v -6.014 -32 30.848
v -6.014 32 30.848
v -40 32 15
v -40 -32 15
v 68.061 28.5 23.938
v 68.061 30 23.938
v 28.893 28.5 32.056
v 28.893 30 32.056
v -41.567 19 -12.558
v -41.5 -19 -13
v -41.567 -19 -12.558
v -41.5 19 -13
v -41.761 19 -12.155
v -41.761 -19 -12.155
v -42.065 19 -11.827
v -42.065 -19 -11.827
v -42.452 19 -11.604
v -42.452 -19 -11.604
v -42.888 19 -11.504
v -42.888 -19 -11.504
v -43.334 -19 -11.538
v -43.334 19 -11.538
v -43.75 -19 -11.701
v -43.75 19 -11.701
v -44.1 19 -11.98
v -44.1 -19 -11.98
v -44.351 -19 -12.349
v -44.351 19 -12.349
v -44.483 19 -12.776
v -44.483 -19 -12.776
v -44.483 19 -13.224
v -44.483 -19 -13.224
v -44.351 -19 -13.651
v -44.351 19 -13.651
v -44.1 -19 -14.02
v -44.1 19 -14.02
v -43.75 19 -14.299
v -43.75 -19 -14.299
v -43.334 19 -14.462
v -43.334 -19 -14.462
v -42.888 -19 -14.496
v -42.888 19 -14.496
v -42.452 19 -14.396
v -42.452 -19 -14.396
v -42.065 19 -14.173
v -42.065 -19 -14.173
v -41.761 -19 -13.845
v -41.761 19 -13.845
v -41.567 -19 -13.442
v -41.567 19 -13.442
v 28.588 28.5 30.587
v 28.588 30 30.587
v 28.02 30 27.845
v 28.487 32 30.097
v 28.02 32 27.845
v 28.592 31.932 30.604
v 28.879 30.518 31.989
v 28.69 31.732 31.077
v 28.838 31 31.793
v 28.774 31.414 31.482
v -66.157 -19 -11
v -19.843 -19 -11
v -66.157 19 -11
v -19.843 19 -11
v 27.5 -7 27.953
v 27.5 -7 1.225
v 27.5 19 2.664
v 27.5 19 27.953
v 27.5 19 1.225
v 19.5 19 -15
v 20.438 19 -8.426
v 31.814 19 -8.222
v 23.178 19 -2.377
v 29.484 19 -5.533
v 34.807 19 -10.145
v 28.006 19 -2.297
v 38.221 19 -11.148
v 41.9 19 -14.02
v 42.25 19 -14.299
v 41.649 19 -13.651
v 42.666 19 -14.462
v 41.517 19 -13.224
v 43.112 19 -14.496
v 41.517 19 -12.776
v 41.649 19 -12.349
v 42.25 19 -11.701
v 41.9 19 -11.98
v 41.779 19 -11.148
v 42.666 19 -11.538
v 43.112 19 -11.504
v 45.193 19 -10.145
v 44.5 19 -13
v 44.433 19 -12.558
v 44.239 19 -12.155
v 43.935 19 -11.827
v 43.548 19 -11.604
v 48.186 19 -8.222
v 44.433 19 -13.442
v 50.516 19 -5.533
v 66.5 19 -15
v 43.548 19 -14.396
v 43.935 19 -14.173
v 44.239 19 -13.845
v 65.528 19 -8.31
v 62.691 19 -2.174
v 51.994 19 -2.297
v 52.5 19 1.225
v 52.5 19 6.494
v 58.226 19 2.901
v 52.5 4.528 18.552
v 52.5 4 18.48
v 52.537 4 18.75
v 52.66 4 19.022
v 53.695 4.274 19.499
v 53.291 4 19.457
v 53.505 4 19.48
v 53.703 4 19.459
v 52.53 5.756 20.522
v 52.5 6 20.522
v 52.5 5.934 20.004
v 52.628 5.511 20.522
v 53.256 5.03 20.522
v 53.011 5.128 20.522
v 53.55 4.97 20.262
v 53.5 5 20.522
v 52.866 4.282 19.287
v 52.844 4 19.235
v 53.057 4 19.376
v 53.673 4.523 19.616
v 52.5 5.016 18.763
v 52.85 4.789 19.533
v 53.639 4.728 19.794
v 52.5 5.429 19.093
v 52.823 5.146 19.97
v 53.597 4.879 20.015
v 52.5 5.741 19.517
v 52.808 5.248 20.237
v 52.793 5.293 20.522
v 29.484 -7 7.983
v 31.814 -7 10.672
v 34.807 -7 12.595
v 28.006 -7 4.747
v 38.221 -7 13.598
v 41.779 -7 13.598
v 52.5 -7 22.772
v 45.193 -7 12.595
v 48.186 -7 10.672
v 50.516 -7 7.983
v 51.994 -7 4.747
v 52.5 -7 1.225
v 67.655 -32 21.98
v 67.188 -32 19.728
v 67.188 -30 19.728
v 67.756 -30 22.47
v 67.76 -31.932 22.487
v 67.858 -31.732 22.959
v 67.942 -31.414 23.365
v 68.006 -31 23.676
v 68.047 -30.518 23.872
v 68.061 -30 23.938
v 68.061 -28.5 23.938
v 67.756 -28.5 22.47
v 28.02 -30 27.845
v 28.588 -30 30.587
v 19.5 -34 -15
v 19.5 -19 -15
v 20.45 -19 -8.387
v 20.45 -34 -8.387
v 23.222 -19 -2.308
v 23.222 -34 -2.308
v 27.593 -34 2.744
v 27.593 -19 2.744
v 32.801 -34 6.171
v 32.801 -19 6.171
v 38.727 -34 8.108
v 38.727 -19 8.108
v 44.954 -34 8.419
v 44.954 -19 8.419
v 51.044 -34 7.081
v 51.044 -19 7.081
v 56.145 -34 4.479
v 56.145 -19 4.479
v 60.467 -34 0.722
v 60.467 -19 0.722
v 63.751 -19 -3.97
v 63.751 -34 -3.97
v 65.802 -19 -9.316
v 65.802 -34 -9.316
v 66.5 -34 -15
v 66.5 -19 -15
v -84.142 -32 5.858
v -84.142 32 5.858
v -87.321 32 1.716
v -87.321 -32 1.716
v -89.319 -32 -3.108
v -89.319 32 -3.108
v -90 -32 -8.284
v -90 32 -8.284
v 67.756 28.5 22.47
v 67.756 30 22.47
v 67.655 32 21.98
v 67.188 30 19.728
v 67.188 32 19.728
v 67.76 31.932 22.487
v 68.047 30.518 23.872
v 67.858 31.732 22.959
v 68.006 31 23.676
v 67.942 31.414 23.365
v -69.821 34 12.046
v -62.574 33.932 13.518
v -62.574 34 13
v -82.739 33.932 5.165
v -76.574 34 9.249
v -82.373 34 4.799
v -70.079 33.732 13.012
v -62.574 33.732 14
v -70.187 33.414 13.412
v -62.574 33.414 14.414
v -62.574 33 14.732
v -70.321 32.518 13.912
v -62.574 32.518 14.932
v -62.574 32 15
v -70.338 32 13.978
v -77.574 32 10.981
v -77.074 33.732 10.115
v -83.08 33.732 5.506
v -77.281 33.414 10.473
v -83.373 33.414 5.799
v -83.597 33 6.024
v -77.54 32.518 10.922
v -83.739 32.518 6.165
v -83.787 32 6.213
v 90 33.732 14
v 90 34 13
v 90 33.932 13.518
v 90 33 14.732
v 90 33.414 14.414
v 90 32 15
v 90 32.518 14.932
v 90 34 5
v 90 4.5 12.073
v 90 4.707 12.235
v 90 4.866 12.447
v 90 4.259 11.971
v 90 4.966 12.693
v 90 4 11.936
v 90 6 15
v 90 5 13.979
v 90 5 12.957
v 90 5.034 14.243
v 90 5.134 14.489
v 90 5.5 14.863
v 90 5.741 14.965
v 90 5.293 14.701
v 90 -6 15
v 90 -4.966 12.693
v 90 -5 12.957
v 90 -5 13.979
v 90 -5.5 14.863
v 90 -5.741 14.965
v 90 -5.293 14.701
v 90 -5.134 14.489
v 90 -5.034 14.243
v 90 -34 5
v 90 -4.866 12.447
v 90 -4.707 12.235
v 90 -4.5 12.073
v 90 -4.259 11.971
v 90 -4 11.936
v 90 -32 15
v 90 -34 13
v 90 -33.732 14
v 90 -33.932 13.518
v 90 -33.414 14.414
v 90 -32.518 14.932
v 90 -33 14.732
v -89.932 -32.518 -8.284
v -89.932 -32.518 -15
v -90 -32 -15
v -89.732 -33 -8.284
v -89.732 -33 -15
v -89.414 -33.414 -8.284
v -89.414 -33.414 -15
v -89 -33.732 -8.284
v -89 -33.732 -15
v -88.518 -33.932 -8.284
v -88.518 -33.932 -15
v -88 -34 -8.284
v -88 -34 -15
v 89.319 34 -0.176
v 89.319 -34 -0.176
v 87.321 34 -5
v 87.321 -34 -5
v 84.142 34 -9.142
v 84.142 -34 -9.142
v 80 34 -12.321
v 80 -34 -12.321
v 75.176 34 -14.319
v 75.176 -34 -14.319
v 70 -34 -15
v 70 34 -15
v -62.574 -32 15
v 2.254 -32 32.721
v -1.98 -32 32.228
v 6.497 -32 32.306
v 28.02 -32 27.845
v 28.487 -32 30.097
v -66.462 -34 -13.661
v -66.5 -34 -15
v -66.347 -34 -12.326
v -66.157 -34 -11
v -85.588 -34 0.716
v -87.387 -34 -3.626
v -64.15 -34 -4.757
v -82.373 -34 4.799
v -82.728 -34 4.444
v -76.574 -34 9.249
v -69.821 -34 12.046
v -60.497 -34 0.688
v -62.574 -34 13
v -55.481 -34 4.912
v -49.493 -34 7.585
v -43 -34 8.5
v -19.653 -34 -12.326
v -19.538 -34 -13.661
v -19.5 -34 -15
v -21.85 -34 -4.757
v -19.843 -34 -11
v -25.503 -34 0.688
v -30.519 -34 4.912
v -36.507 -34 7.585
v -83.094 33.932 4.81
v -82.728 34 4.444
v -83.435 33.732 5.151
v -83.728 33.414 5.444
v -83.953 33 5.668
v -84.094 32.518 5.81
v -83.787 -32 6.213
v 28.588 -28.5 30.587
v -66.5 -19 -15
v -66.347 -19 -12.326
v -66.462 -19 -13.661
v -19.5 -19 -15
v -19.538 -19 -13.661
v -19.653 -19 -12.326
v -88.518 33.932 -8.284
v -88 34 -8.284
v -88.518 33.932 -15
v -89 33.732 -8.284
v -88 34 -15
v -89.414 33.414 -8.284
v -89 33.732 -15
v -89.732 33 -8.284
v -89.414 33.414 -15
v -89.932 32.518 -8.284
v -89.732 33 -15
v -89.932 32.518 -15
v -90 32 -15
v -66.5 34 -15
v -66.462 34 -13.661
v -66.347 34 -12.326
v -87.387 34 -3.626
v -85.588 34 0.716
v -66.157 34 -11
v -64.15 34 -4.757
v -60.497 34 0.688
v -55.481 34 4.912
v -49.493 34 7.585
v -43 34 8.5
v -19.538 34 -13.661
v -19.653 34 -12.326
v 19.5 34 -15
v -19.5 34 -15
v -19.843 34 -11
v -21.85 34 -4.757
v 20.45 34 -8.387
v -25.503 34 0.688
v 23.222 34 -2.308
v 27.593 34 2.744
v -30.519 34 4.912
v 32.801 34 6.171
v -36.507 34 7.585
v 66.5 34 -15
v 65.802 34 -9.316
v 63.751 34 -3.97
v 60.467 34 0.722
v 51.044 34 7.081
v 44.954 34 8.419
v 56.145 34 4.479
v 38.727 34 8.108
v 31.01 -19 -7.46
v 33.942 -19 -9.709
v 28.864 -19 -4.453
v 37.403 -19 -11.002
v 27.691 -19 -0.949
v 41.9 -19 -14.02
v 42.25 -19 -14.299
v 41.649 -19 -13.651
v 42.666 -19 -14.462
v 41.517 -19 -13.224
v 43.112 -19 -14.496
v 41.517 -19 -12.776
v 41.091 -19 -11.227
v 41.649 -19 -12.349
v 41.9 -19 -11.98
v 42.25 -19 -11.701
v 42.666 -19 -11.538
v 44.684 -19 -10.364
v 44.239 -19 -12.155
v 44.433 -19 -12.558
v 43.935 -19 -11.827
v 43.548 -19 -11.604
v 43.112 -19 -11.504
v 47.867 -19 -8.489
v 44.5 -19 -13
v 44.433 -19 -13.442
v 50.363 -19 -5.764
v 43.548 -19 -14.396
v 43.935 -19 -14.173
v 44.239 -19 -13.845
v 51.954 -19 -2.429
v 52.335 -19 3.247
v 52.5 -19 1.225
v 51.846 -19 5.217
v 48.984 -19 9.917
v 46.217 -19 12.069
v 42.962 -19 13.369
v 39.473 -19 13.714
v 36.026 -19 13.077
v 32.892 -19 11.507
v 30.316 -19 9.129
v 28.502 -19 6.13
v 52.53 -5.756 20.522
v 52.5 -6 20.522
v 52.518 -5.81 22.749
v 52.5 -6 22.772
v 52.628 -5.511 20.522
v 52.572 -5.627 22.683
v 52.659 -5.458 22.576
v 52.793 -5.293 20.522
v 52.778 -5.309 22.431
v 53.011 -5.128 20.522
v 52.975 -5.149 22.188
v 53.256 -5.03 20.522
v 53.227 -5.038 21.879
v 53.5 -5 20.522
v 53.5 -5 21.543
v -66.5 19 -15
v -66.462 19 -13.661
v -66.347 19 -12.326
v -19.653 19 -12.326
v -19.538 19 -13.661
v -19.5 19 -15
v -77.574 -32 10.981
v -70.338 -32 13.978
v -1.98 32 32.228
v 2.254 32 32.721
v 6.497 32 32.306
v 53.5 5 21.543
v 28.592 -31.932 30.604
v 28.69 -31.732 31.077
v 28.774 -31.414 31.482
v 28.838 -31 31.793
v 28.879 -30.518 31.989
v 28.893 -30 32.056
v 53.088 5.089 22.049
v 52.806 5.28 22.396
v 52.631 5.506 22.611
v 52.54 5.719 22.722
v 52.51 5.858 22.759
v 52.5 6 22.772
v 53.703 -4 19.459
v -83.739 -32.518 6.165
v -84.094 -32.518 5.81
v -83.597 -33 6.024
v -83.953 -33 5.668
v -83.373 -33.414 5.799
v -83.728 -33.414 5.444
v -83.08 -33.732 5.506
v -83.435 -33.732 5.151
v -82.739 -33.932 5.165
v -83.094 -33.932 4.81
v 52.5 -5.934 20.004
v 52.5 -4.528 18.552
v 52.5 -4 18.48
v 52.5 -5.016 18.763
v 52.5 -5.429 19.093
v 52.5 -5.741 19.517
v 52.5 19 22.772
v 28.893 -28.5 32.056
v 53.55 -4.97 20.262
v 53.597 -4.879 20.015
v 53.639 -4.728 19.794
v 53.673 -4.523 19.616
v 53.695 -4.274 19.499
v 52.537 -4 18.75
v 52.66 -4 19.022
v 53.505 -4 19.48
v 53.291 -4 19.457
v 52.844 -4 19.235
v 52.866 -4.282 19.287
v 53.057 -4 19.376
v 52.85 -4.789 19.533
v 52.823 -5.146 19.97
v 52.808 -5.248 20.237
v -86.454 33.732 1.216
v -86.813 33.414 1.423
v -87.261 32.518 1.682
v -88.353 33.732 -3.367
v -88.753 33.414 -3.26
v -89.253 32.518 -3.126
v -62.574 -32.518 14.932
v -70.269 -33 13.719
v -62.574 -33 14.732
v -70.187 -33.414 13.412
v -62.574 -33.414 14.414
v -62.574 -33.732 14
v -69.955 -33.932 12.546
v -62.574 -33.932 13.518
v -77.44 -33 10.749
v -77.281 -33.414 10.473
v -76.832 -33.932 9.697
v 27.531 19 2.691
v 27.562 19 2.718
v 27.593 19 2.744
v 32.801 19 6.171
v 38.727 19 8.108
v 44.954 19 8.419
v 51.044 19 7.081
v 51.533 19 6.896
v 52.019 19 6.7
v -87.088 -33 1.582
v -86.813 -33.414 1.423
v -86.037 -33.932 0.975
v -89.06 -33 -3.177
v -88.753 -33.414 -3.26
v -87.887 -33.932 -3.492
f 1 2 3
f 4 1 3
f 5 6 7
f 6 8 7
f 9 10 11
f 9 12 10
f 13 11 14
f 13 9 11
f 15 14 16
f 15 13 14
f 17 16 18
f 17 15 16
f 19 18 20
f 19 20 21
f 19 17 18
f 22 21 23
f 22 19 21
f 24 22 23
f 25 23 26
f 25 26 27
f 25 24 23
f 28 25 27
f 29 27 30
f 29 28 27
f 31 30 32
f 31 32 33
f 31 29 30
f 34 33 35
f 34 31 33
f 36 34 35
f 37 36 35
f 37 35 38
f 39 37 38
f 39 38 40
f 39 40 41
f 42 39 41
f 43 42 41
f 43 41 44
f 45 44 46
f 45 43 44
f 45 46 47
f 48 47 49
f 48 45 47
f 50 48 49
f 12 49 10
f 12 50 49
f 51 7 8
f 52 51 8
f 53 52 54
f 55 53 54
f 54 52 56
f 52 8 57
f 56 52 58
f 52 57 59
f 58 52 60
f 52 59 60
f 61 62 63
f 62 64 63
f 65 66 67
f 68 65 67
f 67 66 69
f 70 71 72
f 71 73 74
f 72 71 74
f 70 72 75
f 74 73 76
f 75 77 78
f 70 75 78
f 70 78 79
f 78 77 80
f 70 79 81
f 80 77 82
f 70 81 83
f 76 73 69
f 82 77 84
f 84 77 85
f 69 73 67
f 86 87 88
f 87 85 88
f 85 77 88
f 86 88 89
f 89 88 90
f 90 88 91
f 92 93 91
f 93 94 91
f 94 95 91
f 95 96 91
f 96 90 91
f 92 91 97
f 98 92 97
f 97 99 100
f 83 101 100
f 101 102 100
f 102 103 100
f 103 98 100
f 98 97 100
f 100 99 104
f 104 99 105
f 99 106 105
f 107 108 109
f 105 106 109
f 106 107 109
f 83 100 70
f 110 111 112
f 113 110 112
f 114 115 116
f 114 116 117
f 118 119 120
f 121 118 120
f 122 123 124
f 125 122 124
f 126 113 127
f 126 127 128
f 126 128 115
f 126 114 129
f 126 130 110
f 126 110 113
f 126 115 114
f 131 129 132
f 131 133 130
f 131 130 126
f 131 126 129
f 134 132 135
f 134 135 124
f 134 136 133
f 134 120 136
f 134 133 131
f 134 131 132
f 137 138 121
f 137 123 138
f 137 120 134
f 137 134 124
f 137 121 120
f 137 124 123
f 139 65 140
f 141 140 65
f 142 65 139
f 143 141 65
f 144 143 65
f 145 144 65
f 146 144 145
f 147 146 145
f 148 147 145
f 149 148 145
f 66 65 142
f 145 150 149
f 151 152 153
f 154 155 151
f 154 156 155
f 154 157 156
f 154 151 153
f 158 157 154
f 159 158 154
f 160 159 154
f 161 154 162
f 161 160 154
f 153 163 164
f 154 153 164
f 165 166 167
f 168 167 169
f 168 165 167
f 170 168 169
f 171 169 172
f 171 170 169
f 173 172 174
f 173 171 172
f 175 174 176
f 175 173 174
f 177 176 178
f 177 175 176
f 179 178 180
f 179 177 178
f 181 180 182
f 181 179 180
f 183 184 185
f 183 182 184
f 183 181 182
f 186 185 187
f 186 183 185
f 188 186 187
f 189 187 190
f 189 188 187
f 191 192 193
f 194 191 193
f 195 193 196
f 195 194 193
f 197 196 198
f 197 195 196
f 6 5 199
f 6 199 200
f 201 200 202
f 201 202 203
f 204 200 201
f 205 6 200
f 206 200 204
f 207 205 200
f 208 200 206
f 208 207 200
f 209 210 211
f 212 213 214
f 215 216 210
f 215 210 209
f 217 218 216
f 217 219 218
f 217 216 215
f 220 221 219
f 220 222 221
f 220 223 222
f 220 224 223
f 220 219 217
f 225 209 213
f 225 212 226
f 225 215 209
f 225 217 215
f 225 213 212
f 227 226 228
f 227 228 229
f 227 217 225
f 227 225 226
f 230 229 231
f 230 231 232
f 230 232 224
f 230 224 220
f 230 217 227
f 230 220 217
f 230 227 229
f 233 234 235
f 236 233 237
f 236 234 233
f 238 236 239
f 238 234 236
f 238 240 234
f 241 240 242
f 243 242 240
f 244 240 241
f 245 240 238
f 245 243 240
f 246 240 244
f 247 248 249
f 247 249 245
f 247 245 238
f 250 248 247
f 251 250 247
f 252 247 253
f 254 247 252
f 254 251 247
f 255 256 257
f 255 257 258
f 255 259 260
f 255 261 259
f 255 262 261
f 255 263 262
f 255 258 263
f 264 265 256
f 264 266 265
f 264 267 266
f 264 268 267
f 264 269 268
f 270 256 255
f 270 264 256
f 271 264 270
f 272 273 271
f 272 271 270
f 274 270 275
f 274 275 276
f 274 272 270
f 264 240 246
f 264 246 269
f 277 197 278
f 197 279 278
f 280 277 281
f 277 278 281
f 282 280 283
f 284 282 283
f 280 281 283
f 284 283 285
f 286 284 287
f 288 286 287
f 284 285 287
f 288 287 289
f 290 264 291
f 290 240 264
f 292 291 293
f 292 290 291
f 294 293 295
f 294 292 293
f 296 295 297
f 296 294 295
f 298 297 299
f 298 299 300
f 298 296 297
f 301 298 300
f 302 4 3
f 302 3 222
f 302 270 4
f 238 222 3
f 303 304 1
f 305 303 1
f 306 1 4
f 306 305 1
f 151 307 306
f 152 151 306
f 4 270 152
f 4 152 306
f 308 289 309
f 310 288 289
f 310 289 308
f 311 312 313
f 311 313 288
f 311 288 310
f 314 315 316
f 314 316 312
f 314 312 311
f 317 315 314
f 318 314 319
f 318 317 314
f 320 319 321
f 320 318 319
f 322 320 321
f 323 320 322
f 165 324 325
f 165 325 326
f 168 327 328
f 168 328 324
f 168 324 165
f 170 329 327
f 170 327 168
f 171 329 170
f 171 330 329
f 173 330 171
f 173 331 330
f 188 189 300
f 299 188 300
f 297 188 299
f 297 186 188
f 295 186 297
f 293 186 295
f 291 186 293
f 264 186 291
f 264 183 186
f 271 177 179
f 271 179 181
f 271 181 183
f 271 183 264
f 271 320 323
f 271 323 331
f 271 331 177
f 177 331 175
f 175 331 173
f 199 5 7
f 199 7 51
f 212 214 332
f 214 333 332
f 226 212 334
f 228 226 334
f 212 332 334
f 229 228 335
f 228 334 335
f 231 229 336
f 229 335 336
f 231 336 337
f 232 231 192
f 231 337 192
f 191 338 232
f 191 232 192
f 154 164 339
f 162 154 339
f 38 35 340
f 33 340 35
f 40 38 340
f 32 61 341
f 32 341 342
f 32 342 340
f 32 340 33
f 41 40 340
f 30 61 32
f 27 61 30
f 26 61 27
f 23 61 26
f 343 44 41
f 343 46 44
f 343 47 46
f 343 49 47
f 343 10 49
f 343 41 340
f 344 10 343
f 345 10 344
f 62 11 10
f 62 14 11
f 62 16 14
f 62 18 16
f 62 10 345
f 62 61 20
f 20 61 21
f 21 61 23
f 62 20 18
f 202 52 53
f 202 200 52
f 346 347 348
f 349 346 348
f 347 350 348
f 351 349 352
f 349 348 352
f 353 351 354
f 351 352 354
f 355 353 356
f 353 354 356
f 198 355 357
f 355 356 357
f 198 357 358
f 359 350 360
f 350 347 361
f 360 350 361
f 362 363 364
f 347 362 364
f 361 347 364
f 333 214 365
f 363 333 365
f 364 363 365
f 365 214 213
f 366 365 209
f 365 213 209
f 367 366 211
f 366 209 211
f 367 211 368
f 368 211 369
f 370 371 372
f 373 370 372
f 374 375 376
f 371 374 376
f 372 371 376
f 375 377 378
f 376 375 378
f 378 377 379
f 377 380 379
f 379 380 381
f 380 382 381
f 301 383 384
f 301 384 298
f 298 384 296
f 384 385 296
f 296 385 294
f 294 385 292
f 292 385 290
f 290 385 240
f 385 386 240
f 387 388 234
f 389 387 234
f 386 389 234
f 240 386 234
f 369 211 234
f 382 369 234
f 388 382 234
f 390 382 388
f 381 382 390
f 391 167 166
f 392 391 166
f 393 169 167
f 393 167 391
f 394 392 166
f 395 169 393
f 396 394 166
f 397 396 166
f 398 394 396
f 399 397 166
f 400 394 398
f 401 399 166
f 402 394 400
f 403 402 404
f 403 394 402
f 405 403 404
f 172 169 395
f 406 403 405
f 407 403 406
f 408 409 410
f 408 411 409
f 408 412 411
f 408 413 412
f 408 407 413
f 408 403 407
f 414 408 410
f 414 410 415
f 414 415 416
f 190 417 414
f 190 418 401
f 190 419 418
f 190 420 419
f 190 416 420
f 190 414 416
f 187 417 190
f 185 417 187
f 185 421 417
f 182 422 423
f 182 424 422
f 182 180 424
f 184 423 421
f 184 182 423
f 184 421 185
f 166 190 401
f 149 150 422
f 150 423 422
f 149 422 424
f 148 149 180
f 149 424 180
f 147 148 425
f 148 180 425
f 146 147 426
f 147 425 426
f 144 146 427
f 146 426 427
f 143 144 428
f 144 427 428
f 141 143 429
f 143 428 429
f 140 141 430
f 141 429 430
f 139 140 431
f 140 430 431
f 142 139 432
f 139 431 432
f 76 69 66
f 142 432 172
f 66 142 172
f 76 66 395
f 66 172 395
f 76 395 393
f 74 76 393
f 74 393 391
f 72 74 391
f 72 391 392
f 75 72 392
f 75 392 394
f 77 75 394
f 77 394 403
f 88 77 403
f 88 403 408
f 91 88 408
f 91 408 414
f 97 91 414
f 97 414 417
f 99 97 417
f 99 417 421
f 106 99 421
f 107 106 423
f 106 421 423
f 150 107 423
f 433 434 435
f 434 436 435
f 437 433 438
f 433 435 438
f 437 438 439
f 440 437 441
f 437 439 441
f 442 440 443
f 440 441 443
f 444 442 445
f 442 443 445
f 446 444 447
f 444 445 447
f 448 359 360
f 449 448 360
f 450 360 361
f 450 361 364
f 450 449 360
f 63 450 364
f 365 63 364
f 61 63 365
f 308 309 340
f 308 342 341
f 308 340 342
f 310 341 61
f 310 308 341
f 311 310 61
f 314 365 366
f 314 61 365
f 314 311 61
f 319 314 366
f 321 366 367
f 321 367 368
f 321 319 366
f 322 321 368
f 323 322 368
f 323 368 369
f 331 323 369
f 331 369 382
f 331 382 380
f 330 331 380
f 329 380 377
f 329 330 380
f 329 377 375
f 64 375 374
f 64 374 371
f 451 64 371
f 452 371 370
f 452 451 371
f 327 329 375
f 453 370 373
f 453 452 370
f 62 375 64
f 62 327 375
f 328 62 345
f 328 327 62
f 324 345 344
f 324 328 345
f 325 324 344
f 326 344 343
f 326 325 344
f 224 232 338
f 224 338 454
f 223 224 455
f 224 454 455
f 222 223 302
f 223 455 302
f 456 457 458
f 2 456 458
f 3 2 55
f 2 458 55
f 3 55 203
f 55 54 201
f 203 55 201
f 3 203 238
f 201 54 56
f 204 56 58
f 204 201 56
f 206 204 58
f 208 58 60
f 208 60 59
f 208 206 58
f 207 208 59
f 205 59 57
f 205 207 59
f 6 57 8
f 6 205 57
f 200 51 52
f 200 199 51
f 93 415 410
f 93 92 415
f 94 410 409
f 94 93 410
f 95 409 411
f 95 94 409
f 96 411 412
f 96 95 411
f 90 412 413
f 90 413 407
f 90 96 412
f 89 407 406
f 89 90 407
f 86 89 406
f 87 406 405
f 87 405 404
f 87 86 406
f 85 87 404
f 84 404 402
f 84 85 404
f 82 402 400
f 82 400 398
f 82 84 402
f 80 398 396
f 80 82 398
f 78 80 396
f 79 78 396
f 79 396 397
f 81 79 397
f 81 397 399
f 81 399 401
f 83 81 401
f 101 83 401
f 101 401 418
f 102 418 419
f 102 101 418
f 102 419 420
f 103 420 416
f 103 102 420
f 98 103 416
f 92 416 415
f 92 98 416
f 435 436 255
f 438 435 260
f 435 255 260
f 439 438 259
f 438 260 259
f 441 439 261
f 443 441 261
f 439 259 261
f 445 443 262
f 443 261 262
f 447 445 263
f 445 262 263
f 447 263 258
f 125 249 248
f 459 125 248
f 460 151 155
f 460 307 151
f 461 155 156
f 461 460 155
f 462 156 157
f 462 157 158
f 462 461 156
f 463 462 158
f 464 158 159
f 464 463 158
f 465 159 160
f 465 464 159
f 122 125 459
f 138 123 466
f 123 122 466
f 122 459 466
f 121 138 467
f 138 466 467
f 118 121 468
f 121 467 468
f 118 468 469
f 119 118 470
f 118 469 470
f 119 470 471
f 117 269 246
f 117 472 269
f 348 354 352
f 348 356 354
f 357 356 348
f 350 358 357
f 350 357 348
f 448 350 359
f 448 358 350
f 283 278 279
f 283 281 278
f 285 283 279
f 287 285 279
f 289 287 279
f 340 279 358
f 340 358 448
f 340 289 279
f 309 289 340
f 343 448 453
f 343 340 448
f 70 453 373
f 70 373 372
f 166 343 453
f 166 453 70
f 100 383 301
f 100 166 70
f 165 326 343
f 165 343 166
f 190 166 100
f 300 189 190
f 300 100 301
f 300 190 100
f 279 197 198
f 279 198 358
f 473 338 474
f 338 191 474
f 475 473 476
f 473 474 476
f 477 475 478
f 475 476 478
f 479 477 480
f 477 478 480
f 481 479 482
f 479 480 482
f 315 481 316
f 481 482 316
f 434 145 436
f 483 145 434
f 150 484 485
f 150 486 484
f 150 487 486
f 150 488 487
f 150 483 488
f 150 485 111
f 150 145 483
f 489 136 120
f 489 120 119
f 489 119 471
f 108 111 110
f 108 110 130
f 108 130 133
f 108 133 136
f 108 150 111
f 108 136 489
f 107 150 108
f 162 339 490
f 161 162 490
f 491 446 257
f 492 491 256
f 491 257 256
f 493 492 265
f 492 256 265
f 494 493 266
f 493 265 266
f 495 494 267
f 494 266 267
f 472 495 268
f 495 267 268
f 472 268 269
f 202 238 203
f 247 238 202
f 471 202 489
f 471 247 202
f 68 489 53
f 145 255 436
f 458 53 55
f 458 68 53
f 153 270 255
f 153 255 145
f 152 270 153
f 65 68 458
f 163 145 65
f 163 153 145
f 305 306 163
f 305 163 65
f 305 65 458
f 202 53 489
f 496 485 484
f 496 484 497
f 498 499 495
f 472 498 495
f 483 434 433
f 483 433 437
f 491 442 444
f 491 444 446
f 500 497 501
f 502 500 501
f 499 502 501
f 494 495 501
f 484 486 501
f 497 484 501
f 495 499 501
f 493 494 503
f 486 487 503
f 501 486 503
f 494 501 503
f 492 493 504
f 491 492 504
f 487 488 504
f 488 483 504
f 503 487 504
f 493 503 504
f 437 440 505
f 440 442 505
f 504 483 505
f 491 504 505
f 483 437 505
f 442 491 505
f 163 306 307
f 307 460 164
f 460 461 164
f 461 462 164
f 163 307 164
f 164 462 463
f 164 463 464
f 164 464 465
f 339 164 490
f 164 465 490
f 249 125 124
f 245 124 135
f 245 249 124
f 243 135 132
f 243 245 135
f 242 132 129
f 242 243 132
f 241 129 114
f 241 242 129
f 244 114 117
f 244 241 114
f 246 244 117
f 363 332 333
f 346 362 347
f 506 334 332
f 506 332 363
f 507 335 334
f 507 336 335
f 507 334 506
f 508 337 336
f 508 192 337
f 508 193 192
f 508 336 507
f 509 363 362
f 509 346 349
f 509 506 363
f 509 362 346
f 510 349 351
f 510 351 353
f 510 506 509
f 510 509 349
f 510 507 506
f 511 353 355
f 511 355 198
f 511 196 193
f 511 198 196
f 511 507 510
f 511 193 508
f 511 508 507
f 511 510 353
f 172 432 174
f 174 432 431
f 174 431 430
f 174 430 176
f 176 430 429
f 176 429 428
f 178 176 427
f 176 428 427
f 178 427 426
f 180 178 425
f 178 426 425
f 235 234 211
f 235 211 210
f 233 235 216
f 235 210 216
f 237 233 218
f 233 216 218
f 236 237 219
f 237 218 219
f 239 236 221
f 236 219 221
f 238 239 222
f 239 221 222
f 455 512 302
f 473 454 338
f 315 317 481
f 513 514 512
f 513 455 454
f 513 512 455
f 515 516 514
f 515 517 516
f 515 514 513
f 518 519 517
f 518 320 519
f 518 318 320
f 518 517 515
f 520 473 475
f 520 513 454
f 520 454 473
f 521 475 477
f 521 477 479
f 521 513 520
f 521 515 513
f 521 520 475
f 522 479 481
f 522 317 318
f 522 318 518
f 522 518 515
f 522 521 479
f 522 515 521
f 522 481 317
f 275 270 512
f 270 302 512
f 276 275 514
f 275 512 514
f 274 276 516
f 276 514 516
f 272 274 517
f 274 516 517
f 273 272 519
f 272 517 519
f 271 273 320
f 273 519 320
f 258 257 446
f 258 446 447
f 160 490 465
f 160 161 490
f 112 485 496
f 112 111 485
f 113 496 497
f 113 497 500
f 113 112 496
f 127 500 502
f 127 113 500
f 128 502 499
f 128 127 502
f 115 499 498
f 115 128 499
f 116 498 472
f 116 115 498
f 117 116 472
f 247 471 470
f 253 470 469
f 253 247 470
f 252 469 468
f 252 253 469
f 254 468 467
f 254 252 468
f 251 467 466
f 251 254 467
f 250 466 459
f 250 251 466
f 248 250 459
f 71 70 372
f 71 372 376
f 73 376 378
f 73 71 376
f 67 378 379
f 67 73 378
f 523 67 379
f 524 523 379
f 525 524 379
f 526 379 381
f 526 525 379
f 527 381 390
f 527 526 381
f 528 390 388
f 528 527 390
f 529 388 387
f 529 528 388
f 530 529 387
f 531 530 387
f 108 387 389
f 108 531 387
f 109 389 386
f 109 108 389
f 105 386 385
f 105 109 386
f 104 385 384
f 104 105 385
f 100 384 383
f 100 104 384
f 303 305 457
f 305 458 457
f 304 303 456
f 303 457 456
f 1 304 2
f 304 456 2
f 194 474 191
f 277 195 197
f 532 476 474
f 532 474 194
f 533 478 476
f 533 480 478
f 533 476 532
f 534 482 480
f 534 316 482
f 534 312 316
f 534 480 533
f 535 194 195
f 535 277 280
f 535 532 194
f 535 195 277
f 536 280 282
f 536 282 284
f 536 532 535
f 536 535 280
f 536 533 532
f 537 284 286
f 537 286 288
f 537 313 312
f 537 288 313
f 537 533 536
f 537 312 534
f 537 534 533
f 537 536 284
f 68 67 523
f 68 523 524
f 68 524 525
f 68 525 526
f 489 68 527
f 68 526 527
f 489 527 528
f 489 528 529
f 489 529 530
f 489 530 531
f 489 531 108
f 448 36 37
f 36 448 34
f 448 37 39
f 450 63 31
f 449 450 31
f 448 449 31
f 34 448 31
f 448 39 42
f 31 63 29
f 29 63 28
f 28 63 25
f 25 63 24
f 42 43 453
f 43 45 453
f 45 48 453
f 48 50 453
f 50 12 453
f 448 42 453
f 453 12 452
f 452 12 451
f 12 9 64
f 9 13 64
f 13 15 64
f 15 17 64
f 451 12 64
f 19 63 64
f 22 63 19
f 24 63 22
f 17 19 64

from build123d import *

# Parameters (mm, degrees)
F1_DEPTH       = 34
F2_DEPTH       = 32
F0_R           = 1.5
F3_DEPTH       = 19
F4_R           = 12.5
F5_DEPTH       = 38
F7_W           = 25
F7_H           = 26
F8_DEPTH       = 32.4283063262
F9_R           = 20
F10_R          = 30
F11_R          = 1.99999
F12_R          = 20
F15_DEPTH      = 15
F15_DEPTH_BACK = 25
F16_R          = 2
F17_W          = 10
F17_H          = 6
F18_DEPTH      = 40
F19_R          = 1


# Not quite as in the source:
# - a fillet or chamfer is up to 0.001 mm smaller than in the source, because OpenCascade refuses the exact size


with BuildPart() as f1:
    # F0 (on Front) → F1 (new body, symmetric)
    with BuildSketch(Plane.XZ):
        with BuildLine():
            Line((90, -15), (90, 15))
            Line((90, 15), (-40, 15))
            Line((-40, 15), (-75, 15))
            Line((-75, 15), (-90, 0))
            Line((-90, 0), (-90, -15))
            Line((-90, -15), (-66.5, -15))
            ThreePointArc((-66.5, -15), (-66.4141111332, -12.9926634954), (-66.1570723538, -11))
            ThreePointArc((-66.1570723538, -11), (-43, 8.5), (-19.8429276462, -11))
            ThreePointArc((-19.8429276462, -11), (-19.5858888668, -12.9926634954), (-19.5, -15))
            Line((-19.5, -15), (19.5, -15))
            ThreePointArc((19.5, -15), (21.6186797268, -5.2486337688), (27.5926930532, 2.7444327226))
            ThreePointArc((27.5926930532, 2.7444327226), (37.7272727273, 13.516632815), (51.0436705831, 7.0805200018))
            ThreePointArc((51.0436705831, 7.0805200018), (62.2519642985, -1.5236551451), (66.5, -15))
            Line((66.5, -15), (90, -15))
        make_face()
        with BuildLine():
            ThreePointArc((27.5926930532, 2.7444327226), (38.7272727273, 8.1083059018), (51.0436705831, 7.0805200018))
            ThreePointArc((51.0436705831, 7.0805200018), (37.7272727273, 13.516632815), (27.5926930532, 2.7444327226))
        make_face()
    extrude(amount=F1_DEPTH, both=True)

    # F0 (on Front) → F2 (join, symmetric)
    with BuildSketch(Plane.XZ):
        Polygon((-40, 15), (90, 15), (0, 33.6523063262), align=None)
    extrude(amount=F2_DEPTH, both=True)

    # F0 (on Front) → F3 (join, symmetric)
    with BuildSketch(Plane.XZ):
        with BuildLine():
            Line((-66.5, -15), (-19.5, -15))
            ThreePointArc((-19.5, -15), (-19.5858888668, -12.9926634954), (-19.8429276462, -11))
            Line((-19.8429276462, -11), (-66.1570723538, -11))
            ThreePointArc((-66.1570723538, -11), (-66.4141111332, -12.9926634954), (-66.5, -15))
        make_face()
        with Locations((-43, -13)):
            Circle(F0_R, mode=Mode.SUBTRACT)
        with BuildLine():
            Line((19.5, -15), (66.5, -15))
            ThreePointArc((66.5, -15), (62.2519642985, -1.5236551451), (51.0436705831, 7.0805200018))
            ThreePointArc((51.0436705831, 7.0805200018), (52.1304551087, 4.2419425981), (52.5, 1.2249807396))
            ThreePointArc((52.5, 1.2249807396), (39.2388616534, -11.2518244772), (27.5926930532, 2.7444327226))
            ThreePointArc((27.5926930532, 2.7444327226), (21.6186797268, -5.2486337688), (19.5, -15))
        make_face()
        with Locations((43, -13)):
            Circle(F0_R, mode=Mode.SUBTRACT)
        with BuildLine():
            ThreePointArc((52.5, 1.2249807396), (52.1304551087, 4.2419425981), (51.0436705831, 7.0805200018))
            ThreePointArc((51.0436705831, 7.0805200018), (38.7272727273, 8.1083059018), (27.5926930532, 2.7444327226))
            ThreePointArc((27.5926930532, 2.7444327226), (39.2388616534, -11.2518244772), (52.5, 1.2249807396))
        make_face()
    extrude(amount=F3_DEPTH, both=True)

    # F4 (on face) → F5 (cut)
    with BuildSketch(Plane.XZ.offset(19)):
        with Locations((40, 1.2249807396)):
            Circle(F4_R)
    extrude(amount=-F5_DEPTH, mode=Mode.SUBTRACT)

    # F7 (on offset) → F8 (cut, through all)
    with BuildSketch(Plane.XY.offset(1.225)):
        with Locations((40, 6)):
            Rectangle(F7_W, F7_H)
    extrude(amount=F8_DEPTH, mode=Mode.SUBTRACT)

    # F9
    f9_edges = [f1.edges().sort_by_distance(p)[0] for p in [
        (0, 0, 33.652306),
        (-90, 0, 0),
    ]]
    fillet(f9_edges, radius=F9_R)

    # F10
    f10_edges = [f1.edges().sort_by_distance(p)[0] for p in [
        (-75, 0, 15),
    ]]
    fillet(f10_edges, radius=F10_R)

    # F11 (radius 2 in the source; OpenCascade refuses exactly that, so slightly less here)
    f11_edges = [f1.edges().sort_by_distance(p)[0] for p in [
        (13.713203, -34, 15),
        (13.713203, 34, 15),
    ]]
    fillet(f11_edges, radius=F11_R)

    # F12
    f12_edges = [f1.edges().sort_by_distance(p)[0] for p in [
        (90, 0, -15),
    ]]
    fillet(f12_edges, radius=F12_R)

    # F14 (on face) → F15 (join, two sides)
    with BuildSketch(Plane(origin=(45.8128559398, 0, -9.4946158074), x_dir=(0, 1, 0), z_dir=(0.9791921158, 0, -0.2029354588))) as f15_sk:
        Polygon((-32, 37.2520730314), (-32, 32.9520730314), (-30, 32.9520730314), (-30, 35.7520730314), (-28.5, 35.7520730314), (-28.5, 37.2520730314), align=None)
        Polygon((28.5, 35.7520730314), (30, 35.7520730314), (30, 32.9520730314), (32, 32.9520730314), (32, 37.2520730314), (28.5, 37.2520730314), align=None)
    extrude(amount=F15_DEPTH)
    extrude(f15_sk.sketch, amount=-F15_DEPTH_BACK)

    # F16
    f16_edges = [f1.edges().sort_by_distance(p)[0] for p in [
        (48.476662, -32, 27.996998),
        (48.476662, 32, 27.996998),
    ]]
    fillet(f16_edges, radius=F16_R)

    # F17 (on face) → F18 (cut)
    with BuildSketch(Plane(origin=(45.8128559398, 0, -9.4946158074), x_dir=(0, 1, 0), z_dir=(0.9791921158, 0, -0.2029354588))):
        with Locations((0, 32.9520730314)):
            Rectangle(F17_W, F17_H)
    extrude(amount=F18_DEPTH, mode=Mode.SUBTRACT)

    # F19
    f19_edges = [f1.edges().sort_by_distance(p)[0] for p in [
        (52.5, 0, 19.708044),
        (52.5, -5, 21.239919),
        (52.5, 5, 21.239919),
        (71.25, -5, 15.822147),
        (71.25, 5, 15.822147),
        (71.25, -5, 18.885897),
        (71.25, 5, 18.885897),
    ]]
    fillet(f19_edges, radius=F19_R)


solid = f1.part
